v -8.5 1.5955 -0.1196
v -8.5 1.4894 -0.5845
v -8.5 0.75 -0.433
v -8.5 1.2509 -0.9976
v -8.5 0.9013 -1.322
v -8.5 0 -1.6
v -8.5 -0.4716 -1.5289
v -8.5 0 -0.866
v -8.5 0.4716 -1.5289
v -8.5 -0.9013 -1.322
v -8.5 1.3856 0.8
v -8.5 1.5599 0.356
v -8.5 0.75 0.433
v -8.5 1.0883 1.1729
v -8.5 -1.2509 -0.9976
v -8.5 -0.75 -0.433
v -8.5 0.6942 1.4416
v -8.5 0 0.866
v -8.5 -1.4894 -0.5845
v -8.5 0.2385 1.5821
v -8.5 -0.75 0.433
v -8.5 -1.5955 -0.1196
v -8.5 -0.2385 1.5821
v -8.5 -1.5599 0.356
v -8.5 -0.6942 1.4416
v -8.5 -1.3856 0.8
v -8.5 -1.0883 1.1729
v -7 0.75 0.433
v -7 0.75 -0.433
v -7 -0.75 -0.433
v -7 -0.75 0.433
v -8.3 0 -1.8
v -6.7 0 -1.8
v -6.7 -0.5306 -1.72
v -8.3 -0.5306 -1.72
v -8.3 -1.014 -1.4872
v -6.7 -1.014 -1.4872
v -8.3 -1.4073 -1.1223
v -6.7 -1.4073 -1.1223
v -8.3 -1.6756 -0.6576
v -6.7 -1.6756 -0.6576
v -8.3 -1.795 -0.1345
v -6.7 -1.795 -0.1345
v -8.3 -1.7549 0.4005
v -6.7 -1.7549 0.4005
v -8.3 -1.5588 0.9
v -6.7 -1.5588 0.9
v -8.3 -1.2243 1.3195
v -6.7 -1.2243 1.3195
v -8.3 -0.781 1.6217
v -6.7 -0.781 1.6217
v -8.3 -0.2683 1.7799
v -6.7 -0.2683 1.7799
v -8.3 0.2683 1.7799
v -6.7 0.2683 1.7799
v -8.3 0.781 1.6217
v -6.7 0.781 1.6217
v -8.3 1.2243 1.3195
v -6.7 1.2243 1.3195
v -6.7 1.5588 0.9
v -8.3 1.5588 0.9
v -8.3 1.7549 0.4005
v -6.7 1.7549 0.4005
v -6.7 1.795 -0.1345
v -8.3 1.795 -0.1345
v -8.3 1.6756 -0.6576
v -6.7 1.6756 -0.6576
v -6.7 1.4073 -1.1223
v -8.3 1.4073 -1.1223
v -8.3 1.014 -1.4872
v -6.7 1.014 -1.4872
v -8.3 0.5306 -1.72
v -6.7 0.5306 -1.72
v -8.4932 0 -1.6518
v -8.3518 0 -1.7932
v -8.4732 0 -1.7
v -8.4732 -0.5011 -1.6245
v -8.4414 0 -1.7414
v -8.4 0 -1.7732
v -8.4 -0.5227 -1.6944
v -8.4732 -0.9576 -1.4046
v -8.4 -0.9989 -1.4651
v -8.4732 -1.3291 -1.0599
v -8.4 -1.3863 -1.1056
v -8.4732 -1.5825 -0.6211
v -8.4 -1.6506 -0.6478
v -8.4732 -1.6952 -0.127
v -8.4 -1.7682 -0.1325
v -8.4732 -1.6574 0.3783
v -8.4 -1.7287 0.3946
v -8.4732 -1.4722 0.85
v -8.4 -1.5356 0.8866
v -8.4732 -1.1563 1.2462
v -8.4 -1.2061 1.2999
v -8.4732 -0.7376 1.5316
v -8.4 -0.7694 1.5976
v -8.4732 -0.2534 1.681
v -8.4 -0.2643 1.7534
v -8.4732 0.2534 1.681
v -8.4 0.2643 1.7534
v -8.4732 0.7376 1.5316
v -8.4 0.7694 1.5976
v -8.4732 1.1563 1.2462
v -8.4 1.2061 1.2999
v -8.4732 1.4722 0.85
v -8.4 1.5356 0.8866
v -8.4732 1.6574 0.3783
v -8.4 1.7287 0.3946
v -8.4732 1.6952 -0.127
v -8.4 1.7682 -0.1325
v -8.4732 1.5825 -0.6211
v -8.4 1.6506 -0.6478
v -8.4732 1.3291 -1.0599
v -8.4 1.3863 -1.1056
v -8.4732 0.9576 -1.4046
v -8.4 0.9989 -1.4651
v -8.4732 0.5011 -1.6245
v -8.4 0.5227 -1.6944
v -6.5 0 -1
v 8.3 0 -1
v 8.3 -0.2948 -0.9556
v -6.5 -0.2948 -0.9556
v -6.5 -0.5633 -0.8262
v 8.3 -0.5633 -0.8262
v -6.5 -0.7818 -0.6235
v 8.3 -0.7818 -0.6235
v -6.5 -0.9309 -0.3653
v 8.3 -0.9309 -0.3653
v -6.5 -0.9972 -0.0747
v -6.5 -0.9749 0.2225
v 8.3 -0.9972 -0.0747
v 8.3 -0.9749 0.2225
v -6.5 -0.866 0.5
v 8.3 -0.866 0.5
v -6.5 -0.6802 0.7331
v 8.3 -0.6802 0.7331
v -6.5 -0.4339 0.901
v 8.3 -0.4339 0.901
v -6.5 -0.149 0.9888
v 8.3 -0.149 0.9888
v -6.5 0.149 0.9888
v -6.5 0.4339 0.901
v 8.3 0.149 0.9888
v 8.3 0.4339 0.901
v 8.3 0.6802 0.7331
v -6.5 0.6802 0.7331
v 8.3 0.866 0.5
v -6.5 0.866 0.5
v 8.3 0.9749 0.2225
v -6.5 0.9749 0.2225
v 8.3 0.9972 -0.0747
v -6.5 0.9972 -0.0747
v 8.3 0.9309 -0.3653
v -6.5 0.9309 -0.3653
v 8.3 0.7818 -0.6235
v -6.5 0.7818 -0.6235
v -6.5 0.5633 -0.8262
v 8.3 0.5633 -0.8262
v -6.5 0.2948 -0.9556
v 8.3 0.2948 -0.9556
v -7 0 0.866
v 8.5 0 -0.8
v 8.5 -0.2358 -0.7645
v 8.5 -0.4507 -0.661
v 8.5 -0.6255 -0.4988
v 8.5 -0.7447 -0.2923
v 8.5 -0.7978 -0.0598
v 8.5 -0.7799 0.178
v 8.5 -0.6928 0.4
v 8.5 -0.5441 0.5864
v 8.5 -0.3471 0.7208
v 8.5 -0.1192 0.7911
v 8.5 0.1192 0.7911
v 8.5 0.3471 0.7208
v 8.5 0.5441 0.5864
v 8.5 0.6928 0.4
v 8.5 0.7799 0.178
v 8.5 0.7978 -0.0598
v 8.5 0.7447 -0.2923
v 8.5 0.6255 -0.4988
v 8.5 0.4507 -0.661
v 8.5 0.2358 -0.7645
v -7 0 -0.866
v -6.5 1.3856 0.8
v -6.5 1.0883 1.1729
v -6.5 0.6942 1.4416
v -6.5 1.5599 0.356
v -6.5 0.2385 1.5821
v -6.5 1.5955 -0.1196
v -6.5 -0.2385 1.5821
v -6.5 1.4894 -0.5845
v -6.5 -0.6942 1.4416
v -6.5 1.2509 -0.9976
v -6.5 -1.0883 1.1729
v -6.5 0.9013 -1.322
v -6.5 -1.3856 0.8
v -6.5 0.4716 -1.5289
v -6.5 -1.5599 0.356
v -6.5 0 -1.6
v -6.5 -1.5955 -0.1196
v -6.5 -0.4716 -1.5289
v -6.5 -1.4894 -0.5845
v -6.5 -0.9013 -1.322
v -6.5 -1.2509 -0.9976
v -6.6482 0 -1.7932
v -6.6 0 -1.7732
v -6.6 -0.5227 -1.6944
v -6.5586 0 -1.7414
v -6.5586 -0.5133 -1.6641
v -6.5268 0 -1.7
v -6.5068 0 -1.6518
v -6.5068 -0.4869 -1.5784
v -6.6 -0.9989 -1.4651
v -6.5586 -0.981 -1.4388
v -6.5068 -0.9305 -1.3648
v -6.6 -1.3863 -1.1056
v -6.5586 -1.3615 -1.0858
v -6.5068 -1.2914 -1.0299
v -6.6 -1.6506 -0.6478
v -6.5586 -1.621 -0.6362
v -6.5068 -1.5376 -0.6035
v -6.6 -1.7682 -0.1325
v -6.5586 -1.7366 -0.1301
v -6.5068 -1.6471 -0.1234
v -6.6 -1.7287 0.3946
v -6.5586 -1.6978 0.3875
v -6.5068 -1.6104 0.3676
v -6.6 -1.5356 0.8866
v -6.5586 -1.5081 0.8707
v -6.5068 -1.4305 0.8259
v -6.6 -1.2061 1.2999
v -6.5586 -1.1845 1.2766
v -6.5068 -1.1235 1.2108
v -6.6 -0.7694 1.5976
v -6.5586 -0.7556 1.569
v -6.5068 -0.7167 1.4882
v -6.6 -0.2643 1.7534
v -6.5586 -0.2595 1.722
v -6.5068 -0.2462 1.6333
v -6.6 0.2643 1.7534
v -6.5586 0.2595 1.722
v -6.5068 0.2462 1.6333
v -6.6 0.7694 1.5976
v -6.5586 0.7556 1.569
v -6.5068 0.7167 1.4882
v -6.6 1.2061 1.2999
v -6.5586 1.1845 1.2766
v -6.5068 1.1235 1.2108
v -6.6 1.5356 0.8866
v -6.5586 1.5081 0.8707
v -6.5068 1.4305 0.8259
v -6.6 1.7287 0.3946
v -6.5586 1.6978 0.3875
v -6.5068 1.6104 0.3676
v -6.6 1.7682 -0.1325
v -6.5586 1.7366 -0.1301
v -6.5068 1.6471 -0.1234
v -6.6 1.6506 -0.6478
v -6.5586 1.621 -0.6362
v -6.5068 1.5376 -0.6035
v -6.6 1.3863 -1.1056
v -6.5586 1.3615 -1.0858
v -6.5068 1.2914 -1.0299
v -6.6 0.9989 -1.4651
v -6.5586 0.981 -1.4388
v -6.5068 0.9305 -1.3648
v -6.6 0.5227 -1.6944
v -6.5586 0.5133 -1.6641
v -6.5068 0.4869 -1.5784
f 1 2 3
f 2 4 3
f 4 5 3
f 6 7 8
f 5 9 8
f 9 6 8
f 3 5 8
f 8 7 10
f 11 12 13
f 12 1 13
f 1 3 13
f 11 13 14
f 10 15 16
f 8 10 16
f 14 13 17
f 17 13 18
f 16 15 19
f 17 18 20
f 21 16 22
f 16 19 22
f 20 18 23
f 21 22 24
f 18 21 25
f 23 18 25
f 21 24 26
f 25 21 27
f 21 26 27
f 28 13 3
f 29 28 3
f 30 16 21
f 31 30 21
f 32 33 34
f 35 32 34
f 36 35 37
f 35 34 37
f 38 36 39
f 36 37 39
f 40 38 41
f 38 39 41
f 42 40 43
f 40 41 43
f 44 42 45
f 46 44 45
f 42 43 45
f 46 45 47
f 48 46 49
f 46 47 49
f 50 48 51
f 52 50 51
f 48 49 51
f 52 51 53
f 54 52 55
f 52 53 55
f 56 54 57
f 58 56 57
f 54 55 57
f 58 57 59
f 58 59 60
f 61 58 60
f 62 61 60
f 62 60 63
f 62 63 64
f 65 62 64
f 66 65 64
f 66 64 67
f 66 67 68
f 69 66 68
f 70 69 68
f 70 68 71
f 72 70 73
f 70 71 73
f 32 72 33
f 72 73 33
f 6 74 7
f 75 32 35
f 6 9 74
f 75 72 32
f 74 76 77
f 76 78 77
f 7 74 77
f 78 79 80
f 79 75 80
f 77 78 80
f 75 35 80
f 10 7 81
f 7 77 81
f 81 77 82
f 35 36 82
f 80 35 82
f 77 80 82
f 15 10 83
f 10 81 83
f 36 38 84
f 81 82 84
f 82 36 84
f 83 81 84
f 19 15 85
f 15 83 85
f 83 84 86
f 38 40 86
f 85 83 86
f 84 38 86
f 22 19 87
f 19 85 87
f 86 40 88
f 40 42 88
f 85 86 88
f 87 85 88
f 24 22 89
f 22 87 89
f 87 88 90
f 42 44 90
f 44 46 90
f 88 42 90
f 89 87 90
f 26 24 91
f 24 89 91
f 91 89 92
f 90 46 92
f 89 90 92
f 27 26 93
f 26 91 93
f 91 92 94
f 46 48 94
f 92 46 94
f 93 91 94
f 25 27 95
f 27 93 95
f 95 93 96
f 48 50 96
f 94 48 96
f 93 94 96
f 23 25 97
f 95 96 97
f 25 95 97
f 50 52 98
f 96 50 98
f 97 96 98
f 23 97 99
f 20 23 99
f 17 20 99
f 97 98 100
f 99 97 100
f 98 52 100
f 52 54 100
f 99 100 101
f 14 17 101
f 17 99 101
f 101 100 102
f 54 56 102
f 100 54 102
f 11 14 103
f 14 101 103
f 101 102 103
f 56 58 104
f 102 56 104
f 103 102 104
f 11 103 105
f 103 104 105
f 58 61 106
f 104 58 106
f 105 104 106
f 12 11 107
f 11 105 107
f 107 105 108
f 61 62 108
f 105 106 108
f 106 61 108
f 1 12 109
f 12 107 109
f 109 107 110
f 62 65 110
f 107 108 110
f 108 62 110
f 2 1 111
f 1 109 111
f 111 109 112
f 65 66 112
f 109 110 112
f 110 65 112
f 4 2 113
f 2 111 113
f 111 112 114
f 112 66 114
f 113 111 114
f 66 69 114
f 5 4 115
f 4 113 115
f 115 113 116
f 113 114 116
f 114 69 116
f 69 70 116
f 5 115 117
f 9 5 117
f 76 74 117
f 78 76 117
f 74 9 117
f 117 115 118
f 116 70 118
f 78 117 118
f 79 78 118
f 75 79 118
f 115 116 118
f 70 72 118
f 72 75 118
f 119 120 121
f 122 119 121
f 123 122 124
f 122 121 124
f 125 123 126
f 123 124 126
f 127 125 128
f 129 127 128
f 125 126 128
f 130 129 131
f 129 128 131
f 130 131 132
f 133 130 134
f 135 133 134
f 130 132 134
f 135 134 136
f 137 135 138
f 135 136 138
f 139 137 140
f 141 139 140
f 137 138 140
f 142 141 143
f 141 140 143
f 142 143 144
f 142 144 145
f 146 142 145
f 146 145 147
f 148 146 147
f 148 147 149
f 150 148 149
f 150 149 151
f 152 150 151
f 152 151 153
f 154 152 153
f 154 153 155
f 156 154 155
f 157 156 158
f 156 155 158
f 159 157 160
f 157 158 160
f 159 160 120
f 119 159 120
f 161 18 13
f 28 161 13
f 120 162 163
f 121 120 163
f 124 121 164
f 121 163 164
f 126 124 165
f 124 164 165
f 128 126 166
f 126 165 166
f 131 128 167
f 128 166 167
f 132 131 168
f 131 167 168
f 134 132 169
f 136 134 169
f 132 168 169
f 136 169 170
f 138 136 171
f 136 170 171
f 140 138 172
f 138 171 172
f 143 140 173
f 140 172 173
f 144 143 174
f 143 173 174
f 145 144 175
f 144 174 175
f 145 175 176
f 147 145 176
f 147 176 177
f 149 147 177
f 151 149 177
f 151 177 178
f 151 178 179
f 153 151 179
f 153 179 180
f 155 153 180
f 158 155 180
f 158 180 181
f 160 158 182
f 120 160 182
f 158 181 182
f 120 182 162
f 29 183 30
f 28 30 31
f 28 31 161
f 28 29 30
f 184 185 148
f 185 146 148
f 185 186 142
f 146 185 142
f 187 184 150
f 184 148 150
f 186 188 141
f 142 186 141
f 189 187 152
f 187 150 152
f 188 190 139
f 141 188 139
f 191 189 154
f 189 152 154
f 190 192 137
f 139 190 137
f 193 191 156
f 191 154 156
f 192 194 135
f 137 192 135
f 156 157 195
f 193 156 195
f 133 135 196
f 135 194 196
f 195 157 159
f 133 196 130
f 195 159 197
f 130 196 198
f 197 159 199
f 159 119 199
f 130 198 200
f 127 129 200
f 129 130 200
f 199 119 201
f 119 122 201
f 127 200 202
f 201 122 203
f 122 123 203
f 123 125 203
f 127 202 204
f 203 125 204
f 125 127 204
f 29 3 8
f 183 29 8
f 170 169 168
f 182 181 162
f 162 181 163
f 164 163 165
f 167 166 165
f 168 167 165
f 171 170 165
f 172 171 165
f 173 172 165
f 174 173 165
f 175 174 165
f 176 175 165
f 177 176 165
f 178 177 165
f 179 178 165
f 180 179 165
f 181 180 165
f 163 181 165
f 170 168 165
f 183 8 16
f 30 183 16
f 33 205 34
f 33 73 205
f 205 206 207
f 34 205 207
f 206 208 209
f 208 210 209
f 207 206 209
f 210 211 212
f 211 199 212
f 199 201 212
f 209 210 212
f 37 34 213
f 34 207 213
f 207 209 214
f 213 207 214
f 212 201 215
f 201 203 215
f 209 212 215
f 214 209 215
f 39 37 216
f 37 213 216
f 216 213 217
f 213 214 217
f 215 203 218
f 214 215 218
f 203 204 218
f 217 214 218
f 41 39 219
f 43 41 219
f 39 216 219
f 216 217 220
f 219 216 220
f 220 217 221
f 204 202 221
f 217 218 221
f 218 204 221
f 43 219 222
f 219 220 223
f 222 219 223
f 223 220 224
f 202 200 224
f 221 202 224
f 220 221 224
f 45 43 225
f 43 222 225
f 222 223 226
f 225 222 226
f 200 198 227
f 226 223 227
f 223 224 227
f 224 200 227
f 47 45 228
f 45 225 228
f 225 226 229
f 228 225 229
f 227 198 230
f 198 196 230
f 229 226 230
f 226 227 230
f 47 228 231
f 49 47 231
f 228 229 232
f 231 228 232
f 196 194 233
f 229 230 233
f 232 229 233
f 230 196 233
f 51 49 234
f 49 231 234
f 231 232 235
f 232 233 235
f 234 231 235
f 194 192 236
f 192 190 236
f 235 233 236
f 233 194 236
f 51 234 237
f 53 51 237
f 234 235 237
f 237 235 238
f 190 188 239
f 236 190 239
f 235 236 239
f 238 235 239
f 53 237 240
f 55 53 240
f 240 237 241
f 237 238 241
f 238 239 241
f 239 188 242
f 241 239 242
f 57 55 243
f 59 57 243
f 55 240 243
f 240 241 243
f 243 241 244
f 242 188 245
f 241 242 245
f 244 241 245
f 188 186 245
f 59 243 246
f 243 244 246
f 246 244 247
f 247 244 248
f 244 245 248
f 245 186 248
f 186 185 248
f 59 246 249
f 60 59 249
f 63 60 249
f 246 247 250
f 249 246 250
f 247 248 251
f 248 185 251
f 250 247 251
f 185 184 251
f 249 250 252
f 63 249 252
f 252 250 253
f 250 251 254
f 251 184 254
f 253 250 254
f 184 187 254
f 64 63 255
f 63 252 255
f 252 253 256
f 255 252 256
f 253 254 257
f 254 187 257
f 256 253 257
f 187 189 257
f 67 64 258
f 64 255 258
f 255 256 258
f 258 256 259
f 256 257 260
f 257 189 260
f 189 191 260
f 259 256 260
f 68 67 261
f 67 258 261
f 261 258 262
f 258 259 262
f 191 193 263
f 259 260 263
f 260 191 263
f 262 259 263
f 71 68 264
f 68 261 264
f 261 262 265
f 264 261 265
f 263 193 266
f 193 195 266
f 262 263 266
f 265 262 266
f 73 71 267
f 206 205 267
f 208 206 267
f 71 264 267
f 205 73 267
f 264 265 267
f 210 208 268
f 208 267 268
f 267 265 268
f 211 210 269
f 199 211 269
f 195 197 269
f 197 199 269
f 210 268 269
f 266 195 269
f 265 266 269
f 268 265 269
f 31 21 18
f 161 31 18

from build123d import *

# Parameters (mm, degrees)
CUT_EXTRUDE_1_DEPTH = 1.5
FILLET_1_R          = 0.2
CHAMFER_1_SIZE      = 0.2


with BuildPart() as part:
    # 草图1 → 旋转1 (revolve)
    with BuildSketch(Plane.XY, mode=Mode.PRIVATE) as revolve_1_sk:
        Polygon((-8.5, 0), (-8.5, 1.8), (-6.5, 1.8), (-6.5, 1), (8.5, 1), (8.5, 0), align=None)
    revolve(revolve_1_sk.sketch.rotate(Axis((8.5, 0, 0), (-1, 0, 0)), 90), axis=Axis((8.5, 0, 0), (-1, 0, 0)))

    # 草图2 → 切除-拉伸1 (cut)
    with BuildSketch(Plane.ZY.offset(8.5)):
        Polygon((0.866025404, 0), (0.433012702, 0.75), (-0.433012702, 0.75), (-0.866025404, 0), (-0.433012702, -0.75), (0.433012702, -0.75), align=None)
    extrude(amount=-CUT_EXTRUDE_1_DEPTH, mode=Mode.SUBTRACT)

    # 圆角1
    fillet_1_edges = [part.edges().sort_by_distance(p)[0] for p in [
        (-6.5, 0, 1.8),
        (-8.5, 0, 1.8),
    ]]
    fillet(fillet_1_edges, radius=FILLET_1_R)

    # 倒角1
    chamfer_1_edges = [part.edges().sort_by_distance(p)[0] for p in [
        (8.5, 0, 1),
    ]]
    chamfer(chamfer_1_edges, length=CHAMFER_1_SIZE)


solid = part.part
